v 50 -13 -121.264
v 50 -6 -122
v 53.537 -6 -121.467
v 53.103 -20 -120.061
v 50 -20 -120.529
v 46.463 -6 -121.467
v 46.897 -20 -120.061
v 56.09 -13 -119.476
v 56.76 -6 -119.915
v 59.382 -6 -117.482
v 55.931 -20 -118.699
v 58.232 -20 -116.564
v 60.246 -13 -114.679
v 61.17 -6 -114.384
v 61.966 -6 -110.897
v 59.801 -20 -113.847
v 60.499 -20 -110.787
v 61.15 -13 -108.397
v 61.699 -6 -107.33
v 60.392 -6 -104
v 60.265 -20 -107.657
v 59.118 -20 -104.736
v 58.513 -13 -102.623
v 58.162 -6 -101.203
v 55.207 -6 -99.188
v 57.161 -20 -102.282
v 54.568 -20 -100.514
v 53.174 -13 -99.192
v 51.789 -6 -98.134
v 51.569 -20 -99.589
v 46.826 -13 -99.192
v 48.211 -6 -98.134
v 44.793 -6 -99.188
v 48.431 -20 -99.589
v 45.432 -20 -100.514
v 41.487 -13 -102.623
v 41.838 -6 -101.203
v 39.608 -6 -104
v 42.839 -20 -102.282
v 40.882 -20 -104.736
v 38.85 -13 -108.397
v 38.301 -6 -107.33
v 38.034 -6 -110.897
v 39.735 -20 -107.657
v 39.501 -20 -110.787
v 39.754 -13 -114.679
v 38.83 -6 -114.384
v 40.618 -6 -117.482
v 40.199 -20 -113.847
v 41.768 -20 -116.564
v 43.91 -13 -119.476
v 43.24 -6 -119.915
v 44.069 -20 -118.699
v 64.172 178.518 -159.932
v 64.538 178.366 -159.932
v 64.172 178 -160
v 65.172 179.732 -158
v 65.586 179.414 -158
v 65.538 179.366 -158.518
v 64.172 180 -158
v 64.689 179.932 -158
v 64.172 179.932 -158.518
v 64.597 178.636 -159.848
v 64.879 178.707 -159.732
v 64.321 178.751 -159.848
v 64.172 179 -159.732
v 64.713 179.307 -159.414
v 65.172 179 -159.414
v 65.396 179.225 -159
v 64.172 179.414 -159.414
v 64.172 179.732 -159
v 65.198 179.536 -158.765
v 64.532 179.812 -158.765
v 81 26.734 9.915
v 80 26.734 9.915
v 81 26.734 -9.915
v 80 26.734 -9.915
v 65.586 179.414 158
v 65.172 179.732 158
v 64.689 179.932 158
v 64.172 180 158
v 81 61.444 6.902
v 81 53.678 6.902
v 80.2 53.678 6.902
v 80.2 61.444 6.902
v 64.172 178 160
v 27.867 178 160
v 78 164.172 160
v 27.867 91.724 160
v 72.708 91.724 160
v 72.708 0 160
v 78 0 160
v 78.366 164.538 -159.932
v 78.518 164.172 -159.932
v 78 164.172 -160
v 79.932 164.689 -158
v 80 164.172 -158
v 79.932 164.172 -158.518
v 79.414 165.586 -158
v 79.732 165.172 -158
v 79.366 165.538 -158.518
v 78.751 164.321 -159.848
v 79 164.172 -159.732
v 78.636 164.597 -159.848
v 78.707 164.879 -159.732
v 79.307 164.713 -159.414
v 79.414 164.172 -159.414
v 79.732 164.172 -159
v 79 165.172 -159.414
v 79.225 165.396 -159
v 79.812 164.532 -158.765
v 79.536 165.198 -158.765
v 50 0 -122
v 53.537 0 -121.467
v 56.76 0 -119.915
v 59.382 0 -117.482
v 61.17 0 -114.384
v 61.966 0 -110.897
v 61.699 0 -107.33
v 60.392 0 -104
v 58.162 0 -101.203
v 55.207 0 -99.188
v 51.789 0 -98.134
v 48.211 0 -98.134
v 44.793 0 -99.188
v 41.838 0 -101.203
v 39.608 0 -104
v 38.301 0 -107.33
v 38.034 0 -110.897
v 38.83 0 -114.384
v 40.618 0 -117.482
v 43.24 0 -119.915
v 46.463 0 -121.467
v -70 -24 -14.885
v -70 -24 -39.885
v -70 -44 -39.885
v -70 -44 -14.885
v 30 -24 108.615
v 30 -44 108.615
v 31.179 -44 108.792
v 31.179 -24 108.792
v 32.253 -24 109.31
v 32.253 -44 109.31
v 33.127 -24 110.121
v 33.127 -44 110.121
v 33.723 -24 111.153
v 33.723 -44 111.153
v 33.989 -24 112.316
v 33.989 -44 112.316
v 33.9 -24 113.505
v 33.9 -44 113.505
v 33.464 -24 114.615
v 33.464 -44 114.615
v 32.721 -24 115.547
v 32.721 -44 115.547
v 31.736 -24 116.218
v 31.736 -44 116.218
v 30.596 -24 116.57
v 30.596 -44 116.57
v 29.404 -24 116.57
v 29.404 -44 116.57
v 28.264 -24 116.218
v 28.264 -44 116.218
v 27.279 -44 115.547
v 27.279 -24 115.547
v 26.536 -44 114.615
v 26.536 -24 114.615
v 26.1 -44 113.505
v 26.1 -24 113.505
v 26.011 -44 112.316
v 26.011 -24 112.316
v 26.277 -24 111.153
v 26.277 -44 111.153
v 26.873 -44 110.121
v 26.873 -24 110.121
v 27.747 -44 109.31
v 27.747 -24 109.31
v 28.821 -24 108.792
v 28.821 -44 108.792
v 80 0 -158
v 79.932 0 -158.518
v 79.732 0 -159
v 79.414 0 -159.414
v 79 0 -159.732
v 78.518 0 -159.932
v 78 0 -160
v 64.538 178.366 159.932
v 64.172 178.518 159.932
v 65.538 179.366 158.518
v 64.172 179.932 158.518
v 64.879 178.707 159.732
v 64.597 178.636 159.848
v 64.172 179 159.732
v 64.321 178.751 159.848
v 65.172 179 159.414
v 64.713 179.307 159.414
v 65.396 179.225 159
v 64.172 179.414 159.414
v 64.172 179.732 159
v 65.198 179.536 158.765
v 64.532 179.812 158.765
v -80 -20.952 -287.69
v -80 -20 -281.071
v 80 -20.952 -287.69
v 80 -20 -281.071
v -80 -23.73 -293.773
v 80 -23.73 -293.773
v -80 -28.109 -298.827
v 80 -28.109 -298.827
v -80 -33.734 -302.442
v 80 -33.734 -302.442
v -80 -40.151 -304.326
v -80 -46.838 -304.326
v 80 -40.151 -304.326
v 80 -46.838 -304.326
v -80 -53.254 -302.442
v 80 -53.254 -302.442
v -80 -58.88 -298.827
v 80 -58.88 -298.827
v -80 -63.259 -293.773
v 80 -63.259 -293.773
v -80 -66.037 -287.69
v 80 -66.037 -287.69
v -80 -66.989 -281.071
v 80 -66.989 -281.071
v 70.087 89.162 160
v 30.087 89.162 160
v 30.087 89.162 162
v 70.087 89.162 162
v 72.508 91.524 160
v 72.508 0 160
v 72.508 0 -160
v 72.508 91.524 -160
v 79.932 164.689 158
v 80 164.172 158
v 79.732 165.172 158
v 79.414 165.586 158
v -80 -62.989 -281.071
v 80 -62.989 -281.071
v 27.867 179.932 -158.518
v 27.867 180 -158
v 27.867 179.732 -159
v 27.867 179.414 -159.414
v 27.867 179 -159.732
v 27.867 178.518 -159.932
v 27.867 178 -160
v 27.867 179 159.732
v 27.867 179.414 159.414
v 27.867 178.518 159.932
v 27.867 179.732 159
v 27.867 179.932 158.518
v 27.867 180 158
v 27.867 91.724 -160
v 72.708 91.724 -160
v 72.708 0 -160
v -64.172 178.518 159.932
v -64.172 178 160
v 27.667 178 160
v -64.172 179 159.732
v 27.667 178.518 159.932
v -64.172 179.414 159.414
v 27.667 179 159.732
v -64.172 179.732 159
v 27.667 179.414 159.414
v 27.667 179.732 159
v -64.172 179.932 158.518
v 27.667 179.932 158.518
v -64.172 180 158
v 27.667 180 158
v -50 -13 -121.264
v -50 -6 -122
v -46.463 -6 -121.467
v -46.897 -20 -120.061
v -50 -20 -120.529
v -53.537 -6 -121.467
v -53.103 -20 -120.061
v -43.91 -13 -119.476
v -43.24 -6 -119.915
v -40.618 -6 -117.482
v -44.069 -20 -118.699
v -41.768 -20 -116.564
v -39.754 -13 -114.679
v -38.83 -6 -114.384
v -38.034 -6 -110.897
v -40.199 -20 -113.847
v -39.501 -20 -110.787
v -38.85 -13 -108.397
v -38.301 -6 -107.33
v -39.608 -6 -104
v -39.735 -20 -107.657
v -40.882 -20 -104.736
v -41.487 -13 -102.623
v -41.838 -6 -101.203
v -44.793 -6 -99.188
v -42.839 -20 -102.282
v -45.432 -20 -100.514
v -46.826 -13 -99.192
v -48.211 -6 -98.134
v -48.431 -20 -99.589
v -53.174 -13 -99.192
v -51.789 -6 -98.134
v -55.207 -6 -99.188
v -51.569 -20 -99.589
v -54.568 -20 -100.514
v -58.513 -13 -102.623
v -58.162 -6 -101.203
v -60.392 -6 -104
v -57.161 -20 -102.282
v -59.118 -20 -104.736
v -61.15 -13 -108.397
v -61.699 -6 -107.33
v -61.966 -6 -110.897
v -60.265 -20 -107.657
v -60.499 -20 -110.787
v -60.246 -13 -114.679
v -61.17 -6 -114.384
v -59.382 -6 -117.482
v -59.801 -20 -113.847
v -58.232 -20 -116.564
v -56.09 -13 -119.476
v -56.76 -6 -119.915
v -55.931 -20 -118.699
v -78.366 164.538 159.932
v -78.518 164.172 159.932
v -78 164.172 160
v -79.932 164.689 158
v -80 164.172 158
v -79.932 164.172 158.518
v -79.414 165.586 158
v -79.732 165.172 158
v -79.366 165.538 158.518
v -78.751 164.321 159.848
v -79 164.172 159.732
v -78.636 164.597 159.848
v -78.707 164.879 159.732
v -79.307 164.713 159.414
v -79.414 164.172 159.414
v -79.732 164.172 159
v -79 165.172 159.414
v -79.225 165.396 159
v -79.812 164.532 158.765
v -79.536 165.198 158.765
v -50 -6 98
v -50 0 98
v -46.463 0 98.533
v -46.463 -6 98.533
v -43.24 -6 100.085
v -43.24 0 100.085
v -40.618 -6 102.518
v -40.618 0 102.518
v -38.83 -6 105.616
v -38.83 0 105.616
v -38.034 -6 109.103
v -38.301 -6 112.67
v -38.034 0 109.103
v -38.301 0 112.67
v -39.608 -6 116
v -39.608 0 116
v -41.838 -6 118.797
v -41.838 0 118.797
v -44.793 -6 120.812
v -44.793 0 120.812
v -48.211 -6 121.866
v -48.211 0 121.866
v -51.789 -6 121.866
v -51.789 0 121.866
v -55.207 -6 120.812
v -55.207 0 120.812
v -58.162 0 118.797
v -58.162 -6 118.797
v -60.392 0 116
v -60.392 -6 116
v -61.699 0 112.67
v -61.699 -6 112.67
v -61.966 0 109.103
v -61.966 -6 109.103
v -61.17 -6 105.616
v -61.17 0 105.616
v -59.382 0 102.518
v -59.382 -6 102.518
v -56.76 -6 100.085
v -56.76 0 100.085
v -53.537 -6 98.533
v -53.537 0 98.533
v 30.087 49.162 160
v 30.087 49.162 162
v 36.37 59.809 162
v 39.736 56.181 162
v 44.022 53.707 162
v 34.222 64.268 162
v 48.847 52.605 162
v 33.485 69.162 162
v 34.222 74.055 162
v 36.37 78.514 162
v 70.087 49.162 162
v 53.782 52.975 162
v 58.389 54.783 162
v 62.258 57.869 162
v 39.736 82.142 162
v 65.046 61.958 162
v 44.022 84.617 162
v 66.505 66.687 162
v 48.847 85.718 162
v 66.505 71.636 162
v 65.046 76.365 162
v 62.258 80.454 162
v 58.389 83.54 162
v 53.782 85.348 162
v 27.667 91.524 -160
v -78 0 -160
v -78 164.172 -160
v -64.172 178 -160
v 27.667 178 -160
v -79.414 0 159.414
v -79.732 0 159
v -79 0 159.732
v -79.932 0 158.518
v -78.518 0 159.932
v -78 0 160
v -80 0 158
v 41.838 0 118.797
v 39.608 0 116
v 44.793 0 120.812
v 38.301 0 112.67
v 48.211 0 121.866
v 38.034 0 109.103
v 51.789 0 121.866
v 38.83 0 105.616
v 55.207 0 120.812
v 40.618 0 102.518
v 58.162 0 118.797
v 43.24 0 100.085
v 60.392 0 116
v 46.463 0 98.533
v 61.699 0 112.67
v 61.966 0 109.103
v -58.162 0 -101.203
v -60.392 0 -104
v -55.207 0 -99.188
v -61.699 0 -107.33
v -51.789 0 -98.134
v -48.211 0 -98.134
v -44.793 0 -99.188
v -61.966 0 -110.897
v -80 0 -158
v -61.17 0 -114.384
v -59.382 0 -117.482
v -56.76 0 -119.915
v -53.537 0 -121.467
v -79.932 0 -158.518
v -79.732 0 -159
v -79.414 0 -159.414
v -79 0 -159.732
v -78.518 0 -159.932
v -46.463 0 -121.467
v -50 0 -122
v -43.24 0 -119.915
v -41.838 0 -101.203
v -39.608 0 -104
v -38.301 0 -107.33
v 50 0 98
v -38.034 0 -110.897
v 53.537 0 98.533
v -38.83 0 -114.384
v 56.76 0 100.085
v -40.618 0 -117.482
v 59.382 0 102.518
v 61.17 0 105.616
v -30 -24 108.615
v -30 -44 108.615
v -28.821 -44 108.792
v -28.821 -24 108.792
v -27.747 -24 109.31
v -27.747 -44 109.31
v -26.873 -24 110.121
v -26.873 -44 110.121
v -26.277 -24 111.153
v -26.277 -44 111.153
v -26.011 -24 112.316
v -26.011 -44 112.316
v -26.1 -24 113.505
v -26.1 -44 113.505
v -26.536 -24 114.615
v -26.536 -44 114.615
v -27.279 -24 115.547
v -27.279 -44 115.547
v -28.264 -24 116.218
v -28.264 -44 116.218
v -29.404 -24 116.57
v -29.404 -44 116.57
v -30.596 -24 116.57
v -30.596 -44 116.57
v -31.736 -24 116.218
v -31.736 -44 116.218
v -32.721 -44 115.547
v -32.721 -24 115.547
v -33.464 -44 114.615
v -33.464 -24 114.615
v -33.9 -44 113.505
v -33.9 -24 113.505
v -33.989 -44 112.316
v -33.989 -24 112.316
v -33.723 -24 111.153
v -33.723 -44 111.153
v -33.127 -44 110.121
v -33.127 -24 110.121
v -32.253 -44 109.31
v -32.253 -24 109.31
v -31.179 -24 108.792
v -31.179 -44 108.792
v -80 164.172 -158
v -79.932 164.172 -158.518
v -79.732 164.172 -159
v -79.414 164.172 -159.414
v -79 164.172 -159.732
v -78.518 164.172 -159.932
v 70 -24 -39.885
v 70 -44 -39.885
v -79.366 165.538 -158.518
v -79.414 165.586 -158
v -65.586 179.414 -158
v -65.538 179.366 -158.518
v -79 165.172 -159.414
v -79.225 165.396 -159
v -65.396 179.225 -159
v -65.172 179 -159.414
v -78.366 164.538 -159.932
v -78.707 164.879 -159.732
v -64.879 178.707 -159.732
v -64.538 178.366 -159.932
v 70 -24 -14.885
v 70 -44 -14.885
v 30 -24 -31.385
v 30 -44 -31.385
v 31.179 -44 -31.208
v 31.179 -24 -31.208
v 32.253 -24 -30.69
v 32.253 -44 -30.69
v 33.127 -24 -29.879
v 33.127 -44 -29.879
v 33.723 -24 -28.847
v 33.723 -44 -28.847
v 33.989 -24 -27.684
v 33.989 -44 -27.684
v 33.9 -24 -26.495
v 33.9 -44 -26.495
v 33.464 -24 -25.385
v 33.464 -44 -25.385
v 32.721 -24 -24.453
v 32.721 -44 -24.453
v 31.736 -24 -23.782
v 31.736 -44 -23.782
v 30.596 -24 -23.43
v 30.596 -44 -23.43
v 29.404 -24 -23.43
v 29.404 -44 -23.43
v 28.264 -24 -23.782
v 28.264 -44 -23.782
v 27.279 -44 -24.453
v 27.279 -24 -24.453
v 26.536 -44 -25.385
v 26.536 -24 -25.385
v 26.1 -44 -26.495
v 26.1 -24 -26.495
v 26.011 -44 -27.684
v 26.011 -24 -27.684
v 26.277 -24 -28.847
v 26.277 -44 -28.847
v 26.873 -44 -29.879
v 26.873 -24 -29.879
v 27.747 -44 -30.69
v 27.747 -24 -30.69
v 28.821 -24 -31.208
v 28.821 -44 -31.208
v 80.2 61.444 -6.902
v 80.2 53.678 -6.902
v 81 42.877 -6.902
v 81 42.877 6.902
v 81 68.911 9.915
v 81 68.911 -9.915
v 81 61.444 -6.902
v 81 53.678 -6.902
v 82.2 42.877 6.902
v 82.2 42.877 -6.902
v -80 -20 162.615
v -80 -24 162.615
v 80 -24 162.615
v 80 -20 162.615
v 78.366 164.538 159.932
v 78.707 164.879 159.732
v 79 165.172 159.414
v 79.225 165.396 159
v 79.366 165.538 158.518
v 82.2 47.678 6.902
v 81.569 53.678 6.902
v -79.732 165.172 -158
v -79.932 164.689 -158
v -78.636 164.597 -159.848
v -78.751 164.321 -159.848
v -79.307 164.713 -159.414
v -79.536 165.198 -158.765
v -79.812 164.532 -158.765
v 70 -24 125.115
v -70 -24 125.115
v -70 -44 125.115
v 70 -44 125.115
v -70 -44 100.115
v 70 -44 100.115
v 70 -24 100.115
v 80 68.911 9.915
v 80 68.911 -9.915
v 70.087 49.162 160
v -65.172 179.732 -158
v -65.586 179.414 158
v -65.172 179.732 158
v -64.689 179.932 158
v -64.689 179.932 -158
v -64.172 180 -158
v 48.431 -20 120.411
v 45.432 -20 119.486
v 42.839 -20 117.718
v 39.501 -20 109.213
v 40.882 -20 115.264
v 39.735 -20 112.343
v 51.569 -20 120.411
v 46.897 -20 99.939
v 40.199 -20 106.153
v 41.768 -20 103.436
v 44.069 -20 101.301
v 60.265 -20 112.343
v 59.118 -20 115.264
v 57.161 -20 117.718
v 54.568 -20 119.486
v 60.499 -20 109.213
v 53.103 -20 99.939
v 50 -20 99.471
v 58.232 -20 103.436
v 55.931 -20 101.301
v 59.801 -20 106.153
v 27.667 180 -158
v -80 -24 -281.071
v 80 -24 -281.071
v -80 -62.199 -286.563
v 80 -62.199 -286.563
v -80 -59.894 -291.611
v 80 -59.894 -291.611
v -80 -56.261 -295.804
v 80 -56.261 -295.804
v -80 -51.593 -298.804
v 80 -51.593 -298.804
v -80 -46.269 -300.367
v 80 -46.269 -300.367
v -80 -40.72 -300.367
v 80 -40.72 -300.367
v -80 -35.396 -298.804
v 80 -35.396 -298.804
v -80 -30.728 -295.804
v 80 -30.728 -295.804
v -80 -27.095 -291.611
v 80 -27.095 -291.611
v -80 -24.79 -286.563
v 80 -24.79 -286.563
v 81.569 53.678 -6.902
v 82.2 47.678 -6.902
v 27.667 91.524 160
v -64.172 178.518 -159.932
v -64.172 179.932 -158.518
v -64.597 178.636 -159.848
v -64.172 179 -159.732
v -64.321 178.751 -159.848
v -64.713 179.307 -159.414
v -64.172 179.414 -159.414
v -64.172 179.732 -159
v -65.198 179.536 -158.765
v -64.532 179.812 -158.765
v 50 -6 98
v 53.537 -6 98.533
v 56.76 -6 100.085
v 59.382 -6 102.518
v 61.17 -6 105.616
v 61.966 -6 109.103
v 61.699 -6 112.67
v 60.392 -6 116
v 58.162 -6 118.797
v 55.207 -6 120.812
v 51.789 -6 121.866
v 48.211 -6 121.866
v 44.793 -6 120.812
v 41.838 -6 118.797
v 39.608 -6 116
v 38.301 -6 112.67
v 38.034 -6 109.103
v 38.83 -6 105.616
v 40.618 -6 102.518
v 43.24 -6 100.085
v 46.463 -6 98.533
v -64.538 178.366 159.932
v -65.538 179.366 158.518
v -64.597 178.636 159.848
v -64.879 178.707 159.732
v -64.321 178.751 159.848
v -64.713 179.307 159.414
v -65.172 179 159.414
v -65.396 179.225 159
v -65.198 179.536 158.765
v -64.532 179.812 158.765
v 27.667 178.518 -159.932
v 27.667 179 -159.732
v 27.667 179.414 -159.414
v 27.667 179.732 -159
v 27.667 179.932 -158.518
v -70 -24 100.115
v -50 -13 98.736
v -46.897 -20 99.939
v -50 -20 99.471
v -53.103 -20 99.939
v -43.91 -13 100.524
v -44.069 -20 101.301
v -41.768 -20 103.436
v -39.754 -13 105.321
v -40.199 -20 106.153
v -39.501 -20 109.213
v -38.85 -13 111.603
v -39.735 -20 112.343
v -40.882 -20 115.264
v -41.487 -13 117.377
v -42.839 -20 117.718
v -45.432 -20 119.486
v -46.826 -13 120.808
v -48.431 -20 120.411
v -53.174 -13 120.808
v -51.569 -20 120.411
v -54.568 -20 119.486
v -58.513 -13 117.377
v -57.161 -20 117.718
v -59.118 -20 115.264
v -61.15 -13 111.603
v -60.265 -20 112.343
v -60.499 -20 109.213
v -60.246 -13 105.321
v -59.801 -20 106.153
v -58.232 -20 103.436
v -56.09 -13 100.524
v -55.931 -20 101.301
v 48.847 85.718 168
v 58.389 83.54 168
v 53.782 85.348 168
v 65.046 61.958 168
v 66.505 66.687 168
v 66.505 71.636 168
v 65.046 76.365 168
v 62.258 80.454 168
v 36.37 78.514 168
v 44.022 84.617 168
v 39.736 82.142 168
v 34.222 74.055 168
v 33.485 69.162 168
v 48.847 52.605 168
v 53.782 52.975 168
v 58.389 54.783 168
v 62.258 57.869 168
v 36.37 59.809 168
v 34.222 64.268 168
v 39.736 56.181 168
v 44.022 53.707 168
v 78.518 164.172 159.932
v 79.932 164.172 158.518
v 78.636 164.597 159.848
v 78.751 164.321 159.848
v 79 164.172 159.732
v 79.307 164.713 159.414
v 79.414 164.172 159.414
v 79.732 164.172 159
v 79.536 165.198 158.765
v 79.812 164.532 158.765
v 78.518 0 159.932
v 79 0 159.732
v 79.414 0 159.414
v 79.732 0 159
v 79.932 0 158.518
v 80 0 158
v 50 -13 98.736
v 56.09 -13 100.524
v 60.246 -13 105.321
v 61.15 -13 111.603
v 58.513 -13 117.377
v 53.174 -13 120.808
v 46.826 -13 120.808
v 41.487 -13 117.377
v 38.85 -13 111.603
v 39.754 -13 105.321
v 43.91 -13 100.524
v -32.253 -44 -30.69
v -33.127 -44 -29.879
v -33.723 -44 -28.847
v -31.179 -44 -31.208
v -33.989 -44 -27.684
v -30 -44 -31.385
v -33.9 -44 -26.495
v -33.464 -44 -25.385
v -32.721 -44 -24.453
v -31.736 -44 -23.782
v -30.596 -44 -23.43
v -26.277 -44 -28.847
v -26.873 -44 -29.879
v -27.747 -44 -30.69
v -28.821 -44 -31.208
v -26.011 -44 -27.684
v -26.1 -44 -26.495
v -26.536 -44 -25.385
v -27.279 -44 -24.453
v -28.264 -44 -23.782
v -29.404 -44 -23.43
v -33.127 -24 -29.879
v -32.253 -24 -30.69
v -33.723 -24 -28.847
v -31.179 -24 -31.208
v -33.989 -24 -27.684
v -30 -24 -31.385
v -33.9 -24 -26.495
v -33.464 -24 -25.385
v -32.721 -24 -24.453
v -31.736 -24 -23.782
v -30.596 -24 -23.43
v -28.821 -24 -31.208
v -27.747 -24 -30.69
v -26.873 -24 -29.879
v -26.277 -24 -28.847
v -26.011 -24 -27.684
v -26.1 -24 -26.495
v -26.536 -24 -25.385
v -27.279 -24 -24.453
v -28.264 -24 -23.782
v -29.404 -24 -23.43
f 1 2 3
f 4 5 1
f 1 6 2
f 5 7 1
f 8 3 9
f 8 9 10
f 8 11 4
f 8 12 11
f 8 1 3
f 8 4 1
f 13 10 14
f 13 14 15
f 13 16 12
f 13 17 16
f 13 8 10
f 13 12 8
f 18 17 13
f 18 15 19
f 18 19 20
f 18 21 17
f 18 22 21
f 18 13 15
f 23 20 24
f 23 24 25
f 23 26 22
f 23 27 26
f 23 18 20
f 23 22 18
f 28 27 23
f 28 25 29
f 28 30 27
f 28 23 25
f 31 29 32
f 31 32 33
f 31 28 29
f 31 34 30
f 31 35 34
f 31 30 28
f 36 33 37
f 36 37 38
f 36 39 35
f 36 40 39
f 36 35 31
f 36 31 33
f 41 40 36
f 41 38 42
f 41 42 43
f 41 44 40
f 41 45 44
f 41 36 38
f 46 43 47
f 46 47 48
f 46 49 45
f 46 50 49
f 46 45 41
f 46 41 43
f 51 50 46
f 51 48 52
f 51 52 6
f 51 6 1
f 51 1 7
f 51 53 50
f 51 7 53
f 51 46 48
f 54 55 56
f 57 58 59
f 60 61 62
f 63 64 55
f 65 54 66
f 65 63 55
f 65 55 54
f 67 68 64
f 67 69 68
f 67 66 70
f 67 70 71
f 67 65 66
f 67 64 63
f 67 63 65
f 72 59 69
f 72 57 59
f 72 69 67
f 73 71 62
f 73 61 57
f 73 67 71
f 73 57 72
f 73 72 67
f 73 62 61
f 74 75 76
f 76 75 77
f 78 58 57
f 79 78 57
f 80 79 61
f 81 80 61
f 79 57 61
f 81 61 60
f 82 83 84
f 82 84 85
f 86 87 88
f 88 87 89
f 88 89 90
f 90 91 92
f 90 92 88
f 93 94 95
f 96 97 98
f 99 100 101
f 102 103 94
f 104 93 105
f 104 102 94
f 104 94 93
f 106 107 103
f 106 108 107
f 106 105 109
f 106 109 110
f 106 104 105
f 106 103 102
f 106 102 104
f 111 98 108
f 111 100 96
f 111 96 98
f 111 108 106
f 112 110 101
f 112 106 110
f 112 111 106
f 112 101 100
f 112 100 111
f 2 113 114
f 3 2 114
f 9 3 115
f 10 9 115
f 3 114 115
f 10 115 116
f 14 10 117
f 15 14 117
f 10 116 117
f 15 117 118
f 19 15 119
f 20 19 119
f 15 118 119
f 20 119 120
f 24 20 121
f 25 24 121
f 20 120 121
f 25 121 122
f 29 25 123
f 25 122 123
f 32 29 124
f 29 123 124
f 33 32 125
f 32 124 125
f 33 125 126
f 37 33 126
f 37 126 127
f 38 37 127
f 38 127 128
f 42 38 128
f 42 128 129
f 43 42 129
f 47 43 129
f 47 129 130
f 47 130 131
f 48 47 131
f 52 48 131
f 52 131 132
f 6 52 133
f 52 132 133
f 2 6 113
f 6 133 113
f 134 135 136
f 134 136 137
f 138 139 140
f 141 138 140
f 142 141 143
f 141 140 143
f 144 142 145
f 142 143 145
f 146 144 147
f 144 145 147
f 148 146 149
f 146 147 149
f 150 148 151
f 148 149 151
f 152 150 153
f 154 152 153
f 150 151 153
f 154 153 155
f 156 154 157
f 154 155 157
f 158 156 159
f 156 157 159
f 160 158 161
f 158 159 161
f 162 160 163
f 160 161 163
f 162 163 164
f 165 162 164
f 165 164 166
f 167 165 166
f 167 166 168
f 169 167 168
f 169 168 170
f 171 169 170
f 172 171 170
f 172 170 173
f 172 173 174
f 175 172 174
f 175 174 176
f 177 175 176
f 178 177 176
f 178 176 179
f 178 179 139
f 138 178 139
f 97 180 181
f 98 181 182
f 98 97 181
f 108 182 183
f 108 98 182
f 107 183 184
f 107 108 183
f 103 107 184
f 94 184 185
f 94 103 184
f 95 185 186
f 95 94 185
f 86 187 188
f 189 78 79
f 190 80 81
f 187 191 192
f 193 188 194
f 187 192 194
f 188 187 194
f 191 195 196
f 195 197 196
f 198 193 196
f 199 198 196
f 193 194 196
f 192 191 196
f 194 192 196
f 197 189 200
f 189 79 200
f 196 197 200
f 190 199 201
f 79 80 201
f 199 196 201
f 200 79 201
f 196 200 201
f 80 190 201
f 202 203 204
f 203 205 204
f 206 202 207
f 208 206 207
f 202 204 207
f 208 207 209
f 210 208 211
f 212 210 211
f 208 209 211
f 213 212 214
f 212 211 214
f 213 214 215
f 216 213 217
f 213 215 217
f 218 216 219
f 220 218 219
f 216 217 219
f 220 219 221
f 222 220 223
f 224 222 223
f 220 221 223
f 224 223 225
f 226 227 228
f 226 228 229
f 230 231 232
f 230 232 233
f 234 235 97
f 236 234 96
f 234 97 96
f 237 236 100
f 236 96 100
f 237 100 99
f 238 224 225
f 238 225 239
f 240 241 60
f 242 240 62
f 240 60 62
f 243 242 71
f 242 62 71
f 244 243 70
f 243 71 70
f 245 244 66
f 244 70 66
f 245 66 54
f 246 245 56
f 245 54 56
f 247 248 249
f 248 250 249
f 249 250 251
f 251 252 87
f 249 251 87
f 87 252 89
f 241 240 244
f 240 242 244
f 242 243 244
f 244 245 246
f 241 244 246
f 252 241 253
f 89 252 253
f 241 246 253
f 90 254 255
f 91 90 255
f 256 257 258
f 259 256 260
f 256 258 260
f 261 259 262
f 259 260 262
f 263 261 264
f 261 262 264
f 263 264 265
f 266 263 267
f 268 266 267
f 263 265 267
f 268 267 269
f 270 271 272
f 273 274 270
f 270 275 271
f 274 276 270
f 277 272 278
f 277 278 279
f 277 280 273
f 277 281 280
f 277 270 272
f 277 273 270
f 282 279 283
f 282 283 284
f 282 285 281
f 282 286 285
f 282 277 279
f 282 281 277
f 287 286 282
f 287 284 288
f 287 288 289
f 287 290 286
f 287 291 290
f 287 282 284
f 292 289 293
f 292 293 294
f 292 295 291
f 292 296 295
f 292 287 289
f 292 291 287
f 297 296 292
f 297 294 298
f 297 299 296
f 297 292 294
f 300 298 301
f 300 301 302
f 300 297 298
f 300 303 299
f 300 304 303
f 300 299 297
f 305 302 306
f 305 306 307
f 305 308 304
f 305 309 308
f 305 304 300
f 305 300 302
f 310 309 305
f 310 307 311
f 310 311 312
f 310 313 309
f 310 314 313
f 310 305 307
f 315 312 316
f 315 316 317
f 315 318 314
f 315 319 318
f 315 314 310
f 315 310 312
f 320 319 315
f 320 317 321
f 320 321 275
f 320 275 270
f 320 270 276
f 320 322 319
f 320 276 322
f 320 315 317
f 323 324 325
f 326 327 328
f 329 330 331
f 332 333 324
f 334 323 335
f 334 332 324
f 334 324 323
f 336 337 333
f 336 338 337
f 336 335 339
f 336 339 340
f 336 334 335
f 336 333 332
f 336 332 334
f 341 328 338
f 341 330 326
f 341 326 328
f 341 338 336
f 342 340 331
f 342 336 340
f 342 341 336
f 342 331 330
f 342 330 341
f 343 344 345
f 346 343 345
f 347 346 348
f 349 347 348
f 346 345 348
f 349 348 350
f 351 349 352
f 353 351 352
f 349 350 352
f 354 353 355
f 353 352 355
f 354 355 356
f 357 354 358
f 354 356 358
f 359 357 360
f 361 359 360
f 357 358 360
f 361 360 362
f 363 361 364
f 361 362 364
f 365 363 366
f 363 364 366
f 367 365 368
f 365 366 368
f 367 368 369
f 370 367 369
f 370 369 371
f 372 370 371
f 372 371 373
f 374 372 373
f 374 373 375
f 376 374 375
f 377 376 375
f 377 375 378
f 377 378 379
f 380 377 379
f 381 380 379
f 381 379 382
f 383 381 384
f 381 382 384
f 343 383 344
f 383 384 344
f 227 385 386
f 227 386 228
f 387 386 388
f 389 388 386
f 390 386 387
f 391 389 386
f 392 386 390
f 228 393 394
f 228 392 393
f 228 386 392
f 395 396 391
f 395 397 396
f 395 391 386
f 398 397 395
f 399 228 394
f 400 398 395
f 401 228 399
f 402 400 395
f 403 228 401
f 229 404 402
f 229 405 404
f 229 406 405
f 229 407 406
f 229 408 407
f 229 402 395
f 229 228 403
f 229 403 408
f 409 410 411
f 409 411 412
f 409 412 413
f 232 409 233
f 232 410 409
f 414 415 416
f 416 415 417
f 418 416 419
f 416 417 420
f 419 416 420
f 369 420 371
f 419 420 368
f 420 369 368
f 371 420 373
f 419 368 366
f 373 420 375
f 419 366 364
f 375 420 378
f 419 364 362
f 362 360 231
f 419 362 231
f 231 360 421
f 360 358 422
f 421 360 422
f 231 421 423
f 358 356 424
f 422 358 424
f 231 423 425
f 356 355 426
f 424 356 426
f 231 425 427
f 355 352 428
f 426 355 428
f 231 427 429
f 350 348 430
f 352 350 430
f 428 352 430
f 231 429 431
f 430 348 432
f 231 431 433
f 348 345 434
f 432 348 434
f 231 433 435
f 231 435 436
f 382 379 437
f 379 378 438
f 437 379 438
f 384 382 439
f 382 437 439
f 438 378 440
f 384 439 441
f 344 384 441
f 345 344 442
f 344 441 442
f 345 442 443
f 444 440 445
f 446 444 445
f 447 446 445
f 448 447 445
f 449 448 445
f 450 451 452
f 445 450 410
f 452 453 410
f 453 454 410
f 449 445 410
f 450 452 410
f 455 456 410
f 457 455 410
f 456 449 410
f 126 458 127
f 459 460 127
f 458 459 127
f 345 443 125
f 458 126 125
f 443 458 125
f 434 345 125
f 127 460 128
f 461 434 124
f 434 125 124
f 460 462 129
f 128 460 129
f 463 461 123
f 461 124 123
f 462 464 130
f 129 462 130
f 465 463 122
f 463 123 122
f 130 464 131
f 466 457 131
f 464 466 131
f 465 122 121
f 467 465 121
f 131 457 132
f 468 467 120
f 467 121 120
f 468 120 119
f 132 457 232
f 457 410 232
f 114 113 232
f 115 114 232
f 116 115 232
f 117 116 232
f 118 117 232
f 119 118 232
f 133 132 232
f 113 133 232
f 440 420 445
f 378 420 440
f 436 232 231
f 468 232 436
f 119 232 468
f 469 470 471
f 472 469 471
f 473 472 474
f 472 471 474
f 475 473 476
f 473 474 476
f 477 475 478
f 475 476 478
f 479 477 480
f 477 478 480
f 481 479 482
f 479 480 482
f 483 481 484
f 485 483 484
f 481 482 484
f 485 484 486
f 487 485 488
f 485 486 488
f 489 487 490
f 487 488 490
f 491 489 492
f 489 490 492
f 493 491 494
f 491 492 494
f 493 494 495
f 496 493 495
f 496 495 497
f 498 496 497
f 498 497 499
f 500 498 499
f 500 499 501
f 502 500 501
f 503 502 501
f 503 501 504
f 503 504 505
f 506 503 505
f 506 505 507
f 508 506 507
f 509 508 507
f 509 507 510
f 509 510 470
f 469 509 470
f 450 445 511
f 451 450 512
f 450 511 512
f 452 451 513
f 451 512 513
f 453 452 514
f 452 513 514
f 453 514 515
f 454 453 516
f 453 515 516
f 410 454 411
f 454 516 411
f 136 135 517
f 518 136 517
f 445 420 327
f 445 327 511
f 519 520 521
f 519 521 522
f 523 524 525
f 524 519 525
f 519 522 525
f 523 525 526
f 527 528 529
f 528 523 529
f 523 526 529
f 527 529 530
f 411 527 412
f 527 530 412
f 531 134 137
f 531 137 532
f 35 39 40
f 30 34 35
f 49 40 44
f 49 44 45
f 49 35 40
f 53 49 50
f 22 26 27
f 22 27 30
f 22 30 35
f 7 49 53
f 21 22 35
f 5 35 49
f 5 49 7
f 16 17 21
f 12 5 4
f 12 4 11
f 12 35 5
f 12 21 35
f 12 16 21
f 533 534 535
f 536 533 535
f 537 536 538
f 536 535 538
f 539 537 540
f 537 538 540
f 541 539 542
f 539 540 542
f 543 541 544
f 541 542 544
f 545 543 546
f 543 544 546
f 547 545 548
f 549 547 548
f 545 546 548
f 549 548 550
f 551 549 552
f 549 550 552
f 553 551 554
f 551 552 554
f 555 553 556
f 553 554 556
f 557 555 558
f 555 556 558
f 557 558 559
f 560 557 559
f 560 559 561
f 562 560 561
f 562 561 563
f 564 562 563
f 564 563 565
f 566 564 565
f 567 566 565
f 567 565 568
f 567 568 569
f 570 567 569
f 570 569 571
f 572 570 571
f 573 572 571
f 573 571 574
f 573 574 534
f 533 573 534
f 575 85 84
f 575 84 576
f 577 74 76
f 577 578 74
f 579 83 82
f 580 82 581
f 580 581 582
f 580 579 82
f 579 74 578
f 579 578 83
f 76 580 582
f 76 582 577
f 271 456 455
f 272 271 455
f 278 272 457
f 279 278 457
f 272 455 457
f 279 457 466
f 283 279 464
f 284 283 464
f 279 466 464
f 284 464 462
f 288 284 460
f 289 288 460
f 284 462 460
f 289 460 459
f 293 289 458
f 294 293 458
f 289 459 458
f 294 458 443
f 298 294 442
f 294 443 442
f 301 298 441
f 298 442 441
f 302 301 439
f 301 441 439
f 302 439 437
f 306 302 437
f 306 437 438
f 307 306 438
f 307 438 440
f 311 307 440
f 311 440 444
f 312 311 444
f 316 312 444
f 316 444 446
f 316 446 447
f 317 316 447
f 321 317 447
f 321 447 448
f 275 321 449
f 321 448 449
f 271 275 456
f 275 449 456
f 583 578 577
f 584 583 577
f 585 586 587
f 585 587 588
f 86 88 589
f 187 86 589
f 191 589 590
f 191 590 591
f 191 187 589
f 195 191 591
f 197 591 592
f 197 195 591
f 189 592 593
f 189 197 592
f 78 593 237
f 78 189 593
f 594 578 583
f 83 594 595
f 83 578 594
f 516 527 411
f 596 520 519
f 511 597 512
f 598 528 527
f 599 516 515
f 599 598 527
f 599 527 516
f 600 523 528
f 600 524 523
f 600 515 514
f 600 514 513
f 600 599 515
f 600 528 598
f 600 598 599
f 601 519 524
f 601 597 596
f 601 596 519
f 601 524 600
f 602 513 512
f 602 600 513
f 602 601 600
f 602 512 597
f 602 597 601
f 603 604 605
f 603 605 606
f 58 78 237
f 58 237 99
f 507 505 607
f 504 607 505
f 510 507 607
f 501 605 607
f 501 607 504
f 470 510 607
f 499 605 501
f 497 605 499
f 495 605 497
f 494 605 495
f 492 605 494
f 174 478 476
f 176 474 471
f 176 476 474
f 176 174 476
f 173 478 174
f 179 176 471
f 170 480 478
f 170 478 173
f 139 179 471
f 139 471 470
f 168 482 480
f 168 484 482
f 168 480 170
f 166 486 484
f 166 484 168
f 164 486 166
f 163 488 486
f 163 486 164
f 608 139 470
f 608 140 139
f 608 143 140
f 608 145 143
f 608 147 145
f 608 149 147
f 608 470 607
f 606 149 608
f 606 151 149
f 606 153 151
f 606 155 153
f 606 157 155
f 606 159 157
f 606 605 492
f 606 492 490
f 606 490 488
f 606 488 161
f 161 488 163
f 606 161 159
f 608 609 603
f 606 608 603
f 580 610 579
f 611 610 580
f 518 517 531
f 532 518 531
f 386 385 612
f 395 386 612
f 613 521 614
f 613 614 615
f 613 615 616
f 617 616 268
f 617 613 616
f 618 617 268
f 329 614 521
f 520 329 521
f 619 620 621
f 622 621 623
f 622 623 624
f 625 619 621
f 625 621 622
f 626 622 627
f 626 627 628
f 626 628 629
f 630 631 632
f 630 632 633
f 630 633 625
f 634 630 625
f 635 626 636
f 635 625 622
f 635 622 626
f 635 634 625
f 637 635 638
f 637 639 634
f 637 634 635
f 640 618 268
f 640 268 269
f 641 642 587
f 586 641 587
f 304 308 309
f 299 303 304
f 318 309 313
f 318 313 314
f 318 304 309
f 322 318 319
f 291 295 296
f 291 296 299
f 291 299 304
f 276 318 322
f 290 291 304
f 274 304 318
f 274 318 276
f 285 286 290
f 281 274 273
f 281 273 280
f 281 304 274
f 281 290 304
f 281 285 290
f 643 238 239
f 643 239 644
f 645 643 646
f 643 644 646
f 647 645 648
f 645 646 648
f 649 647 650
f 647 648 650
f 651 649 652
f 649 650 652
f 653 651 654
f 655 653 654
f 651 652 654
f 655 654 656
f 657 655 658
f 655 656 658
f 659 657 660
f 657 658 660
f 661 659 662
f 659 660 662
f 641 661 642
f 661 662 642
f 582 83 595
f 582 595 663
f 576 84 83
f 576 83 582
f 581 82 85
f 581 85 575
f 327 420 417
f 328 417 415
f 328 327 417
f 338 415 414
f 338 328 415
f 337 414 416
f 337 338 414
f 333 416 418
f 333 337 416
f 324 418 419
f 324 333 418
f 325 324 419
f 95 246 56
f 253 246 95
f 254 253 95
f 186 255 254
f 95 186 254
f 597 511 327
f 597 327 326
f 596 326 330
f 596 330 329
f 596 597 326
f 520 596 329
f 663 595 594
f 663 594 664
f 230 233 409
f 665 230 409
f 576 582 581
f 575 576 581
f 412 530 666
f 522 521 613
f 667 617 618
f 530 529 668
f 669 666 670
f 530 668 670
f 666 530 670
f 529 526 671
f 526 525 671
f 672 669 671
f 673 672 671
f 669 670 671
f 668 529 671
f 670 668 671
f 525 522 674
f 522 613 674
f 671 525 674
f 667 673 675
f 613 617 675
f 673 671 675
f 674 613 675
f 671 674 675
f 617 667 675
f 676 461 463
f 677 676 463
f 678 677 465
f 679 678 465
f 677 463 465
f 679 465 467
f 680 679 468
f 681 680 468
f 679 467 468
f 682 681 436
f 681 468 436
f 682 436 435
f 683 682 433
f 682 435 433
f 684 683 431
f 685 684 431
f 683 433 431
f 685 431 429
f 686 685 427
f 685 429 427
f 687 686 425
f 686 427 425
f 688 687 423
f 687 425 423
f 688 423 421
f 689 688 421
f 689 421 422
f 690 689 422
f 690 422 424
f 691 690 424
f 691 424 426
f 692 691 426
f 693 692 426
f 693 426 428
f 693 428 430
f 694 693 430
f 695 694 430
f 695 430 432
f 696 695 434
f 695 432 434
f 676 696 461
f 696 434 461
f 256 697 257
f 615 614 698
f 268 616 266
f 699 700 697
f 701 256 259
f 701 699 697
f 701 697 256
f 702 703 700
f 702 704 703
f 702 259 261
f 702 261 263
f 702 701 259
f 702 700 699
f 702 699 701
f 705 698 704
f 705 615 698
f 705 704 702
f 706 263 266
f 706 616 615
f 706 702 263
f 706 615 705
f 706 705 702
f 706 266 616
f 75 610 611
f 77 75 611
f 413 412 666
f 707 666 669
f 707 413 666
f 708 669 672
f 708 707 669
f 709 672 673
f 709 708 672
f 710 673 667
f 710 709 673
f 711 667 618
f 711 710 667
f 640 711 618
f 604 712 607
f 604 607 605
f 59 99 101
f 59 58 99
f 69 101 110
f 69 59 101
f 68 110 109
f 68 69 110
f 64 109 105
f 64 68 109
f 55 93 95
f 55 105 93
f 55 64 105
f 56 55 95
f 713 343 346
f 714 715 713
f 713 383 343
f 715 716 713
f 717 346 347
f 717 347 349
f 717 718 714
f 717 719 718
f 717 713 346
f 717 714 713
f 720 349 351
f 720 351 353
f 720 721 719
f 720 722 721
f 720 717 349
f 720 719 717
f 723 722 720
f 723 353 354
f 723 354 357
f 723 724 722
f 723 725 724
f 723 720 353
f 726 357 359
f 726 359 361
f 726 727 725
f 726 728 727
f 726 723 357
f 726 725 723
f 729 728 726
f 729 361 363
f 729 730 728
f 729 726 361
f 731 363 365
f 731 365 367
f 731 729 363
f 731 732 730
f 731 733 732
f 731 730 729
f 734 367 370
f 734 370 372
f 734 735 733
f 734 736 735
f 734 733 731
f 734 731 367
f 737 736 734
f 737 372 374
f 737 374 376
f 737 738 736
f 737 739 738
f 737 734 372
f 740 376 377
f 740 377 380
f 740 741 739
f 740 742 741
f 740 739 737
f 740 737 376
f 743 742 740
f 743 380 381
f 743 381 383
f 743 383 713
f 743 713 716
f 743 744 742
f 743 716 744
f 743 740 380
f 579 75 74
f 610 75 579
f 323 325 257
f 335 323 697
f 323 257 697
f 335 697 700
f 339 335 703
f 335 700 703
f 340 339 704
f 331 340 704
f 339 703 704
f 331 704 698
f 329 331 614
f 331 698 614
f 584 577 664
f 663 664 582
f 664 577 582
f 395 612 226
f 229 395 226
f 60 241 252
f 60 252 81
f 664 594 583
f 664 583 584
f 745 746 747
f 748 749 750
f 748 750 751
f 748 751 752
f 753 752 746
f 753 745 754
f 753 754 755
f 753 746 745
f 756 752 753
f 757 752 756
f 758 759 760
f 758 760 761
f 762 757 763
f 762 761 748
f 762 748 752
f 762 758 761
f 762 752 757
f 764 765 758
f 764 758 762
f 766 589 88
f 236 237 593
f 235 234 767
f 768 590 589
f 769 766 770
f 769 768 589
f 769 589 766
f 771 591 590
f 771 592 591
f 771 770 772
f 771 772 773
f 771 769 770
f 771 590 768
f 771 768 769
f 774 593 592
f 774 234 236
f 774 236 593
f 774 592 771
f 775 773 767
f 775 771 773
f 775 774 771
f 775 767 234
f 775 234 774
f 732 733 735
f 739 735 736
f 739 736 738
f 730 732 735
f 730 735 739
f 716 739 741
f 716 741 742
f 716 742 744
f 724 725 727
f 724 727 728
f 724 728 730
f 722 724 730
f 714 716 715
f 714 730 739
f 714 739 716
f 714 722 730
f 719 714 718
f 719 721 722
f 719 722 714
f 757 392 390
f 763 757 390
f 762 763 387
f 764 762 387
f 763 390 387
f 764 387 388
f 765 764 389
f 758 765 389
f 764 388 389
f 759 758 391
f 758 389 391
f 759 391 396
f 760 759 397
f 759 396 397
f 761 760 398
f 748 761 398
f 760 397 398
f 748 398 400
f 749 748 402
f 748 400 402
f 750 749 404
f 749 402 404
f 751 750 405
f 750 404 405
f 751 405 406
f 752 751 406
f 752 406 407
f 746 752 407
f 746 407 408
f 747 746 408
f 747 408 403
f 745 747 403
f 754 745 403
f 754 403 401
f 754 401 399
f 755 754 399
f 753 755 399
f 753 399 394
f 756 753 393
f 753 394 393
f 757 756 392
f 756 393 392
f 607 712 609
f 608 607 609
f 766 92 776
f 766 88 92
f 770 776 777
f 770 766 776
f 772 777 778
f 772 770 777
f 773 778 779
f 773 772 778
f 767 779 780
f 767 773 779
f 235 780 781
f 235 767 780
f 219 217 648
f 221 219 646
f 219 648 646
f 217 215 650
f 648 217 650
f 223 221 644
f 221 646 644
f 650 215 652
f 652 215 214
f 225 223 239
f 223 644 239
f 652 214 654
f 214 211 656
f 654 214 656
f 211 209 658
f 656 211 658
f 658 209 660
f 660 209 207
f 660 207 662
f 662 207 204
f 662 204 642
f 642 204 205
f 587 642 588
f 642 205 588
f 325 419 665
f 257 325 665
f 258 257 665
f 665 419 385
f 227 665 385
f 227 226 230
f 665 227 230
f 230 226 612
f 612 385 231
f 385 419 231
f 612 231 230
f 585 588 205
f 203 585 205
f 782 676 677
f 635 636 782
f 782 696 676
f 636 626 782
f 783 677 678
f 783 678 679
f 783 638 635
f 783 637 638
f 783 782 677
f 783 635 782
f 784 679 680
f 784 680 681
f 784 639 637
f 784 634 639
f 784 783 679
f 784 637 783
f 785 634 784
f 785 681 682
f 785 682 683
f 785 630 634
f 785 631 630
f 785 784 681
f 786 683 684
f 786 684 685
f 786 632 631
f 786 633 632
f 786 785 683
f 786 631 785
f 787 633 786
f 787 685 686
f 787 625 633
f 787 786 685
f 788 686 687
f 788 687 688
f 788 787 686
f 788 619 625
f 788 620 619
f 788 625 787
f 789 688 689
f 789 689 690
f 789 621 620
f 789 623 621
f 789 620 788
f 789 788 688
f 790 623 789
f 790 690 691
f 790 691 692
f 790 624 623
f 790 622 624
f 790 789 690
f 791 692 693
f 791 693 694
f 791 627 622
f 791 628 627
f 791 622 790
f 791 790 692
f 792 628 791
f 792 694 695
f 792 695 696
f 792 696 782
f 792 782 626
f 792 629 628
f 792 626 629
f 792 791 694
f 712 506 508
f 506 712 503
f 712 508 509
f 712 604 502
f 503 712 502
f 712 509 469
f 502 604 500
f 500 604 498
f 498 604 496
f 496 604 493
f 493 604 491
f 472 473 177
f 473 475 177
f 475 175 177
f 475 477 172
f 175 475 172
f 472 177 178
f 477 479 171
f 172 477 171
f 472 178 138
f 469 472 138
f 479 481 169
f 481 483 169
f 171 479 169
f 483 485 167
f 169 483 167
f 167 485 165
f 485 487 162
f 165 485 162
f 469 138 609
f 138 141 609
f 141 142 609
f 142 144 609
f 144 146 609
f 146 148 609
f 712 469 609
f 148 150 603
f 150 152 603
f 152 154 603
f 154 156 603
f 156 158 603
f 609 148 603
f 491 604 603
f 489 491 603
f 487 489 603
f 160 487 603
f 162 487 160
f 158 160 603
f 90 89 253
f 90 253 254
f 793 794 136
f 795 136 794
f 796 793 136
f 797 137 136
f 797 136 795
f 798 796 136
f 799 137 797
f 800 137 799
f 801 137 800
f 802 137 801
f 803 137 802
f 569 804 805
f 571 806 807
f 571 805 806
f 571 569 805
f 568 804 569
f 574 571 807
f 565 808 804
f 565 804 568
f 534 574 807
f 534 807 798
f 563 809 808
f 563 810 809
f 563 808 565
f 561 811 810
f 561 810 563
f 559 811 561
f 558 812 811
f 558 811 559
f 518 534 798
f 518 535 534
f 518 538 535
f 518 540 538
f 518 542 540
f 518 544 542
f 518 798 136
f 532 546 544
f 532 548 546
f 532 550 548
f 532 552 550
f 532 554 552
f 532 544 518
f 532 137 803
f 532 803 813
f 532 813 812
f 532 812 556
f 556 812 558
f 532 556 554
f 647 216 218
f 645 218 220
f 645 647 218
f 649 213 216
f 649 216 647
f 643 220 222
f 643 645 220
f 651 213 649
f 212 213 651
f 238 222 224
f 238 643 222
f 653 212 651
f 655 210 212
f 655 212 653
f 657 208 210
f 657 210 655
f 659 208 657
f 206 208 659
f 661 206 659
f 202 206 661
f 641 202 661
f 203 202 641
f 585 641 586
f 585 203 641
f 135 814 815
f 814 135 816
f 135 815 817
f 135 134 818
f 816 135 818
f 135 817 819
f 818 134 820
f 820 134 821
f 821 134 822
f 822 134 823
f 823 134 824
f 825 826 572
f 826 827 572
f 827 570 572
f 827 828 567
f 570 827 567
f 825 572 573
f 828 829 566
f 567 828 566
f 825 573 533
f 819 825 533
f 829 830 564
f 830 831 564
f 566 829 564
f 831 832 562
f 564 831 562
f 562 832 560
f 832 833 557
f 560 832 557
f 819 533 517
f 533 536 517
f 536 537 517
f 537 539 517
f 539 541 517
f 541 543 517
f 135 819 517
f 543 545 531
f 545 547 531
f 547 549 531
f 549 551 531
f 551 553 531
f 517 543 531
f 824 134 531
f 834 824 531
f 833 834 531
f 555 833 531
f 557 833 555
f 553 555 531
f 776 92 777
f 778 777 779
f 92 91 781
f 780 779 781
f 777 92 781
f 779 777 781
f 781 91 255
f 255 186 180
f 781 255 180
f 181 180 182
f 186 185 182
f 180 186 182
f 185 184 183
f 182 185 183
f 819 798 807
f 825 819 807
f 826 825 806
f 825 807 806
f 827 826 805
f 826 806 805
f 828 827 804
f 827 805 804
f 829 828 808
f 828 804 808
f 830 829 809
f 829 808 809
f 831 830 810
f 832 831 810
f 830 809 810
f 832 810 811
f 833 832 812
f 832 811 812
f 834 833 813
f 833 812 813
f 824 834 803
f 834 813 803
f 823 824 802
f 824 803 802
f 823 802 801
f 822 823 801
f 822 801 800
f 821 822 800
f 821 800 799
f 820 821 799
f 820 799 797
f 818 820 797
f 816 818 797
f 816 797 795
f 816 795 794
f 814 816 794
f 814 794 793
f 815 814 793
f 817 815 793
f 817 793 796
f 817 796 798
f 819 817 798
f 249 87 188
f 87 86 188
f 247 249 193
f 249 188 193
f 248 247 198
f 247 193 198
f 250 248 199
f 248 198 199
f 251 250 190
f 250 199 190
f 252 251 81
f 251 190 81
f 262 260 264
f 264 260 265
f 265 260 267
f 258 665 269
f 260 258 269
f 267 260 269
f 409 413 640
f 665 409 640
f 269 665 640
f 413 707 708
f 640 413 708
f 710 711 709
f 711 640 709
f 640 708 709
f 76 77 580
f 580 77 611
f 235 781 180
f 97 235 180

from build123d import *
from OCP.BRepFilletAPI import BRepFilletAPI_MakeChamfer

# Parameters (mm, degrees)
SKETCH_1_W               = 160
SKETCH_1_H               = 320
EXTRUDE_1_DEPTH          = 180
CUT_EXTRUDE_3_DEPTH      = 0.2
CUT_EXTRUDE_3_DEPTH_BACK = 376.765884561
CHAMFER_1_SIZE           = 15
CHAMFER_2_SIZE           = 15
FILLET_1_R               = 2
FILLET_2_R               = 2
SKETCH_3_W               = 19.82949963
SKETCH_3_H               = 42.177030959
EXTRUDE_2_DEPTH          = 1
SKETCH_4_W               = 13.804854044
SKETCH_4_H               = 18.566163121
CUT_EXTRUDE_2_DEPTH      = 0.8
SKETCH_5_W               = 40
SKETCH_5_H               = 40
EXTRUDE_3_DEPTH          = 2
SKETCH_6_R               = 16.60269393
EXTRUDE_4_DEPTH          = 6
SKETCH_7_R               = 12
EXTRUDE_5_DEPTH          = 20
CHAMFER_3_SIZE           = 14
CHAMFER_3_SIZE2          = 1.471459294
EXTRUDE_6_DEPTH          = 80
SKETCH_10_W              = 140
SKETCH_10_H              = 25
EXTRUDE_7_DEPTH          = 20
EXTRUDE_7_2_DEPTH        = 20
SKETCH_11_R              = 4
CUT_EXTRUDE_3_2_DEPTH    = 30
SKETCH_13_W              = 13.804854044
SKETCH_13_H              = 10.800130904
EXTRUDE_8_DEPTH          = 2
CHAMFER_4_SIZE           = 6
CHAMFER_4_SIZE2          = 0.630625412


with BuildPart() as part:
    # 草图1 → 凸台-拉伸1 (new body)
    with BuildSketch(Plane(origin=(0, 0, 0), x_dir=(1, 0, 0), z_dir=(0, 1, 0))):
        Rectangle(SKETCH_1_W, SKETCH_1_H)
    extrude(amount=EXTRUDE_1_DEPTH)

    # 草图2 → Cut-Extrude 3 (cut, two sides: drawn at the far end of the back side and taken through both)
    with BuildSketch(Plane.XY.offset(160).offset(-CUT_EXTRUDE_3_DEPTH_BACK)):
        Polygon((27.867220045, 180), (27.867220045, 91.72383251), (72.707594266, 91.72383251), (72.707594266, 0), (72.507594266, 0), (72.507594266, 91.52383251), (27.667220045, 91.52383251), (27.667220045, 180), align=None)
    extrude(amount=CUT_EXTRUDE_3_DEPTH + CUT_EXTRUDE_3_DEPTH_BACK, mode=Mode.SUBTRACT)


with BuildPart() as cut_extrude_3_piece_1:
    # of the separate pieces the step leaves, piece 1, a body of its own (cut_extrude_3_pieces)
    add(part.part.solids().sort_by_distance((-80, 0, 160))[0])

    # 倒角2
    chamfer_2_edges = [cut_extrude_3_piece_1.edges().sort_by_distance(p)[0] for p in [
        (-80, 180, 0),
    ]]
    chamfer(chamfer_2_edges, length=CHAMFER_2_SIZE)

    # 圆角2
    fillet_2_edges = [cut_extrude_3_piece_1.edges().sort_by_distance(p)[0] for p in [
        (-18.666389977, 180, 160),
        (-65, 180, 0),
        (-80, 82.5, 160),
        (-72.5, 172.5, 160),
        (-80, 82.5, -160),
        (-80, 165, 0),
        (-72.5, 172.5, -160),
        (-18.666389977, 180, -160),
    ]]
    fillet(fillet_2_edges, radius=FILLET_2_R)

    # 草图5 → 凸台-拉伸3 (add)
    with BuildSketch(Plane.XY.offset(160)):
        with Locations((50.087407156, 69.161685825)):
            Rectangle(SKETCH_5_W, SKETCH_5_H)
    extrude(amount=EXTRUDE_3_DEPTH)

    # 草图6 → 凸台-拉伸4 (add)
    with BuildSketch(Plane.XY.offset(162)):
        with Locations(Location((50.087407156, 69.161685825, 0), (0, 0, 180))):
            Circle(SKETCH_6_R)
    extrude(amount=EXTRUDE_4_DEPTH)

    # 草图7 → 凸台-拉伸5 (add)
    with BuildSketch(Plane.XZ):
        with Locations(Location((-50, 110, 0), (0, 0, 270))):
            Circle(SKETCH_7_R)
        with Locations(Location((50, 110, 0), (0, 0, 270))):
            Circle(SKETCH_7_R)
        with Locations(Location((-50, -110, 0), (0, 0, 270))):
            Circle(SKETCH_7_R)
        with Locations(Location((50, -110, 0), (0, 0, 270))):
            Circle(SKETCH_7_R)
    extrude(amount=EXTRUDE_5_DEPTH)

    # 倒角3: one chamfer whose edges measure the first distance from different faces: ONE call of the kernel's chamfer builder (chamfer() names one face for all edges)
    chamfer_3_edges_1 = [cut_extrude_3_piece_1.edges().sort_by_distance(p)[0] for p in [
        (-50, -20, 122),
    ]]
    chamfer_3_side_1 = [cut_extrude_3_piece_1.faces().sort_by_distance(p)[0] for p in [
        (-50, -10, 122),
    ]]
    chamfer_3_edges_2 = [cut_extrude_3_piece_1.edges().sort_by_distance(p)[0] for p in [
        (50, -20, 122),
    ]]
    chamfer_3_side_2 = [cut_extrude_3_piece_1.faces().sort_by_distance(p)[0] for p in [
        (50, -10, 122),
    ]]
    chamfer_3_edges_3 = [cut_extrude_3_piece_1.edges().sort_by_distance(p)[0] for p in [
        (-50, -20, -98),
    ]]
    chamfer_3_side_3 = [cut_extrude_3_piece_1.faces().sort_by_distance(p)[0] for p in [
        (-50, -10, -98),
    ]]
    chamfer_3_edges_4 = [cut_extrude_3_piece_1.edges().sort_by_distance(p)[0] for p in [
        (50, -20, -98),
    ]]
    chamfer_3_side_4 = [cut_extrude_3_piece_1.faces().sort_by_distance(p)[0] for p in [
        (50, -10, -98),
    ]]
    chamfer_3 = BRepFilletAPI_MakeChamfer(cut_extrude_3_piece_1.part.solid().wrapped)
    for e in chamfer_3_edges_1:
        chamfer_3.Add(CHAMFER_3_SIZE, CHAMFER_3_SIZE2, e.wrapped, chamfer_3_side_1[0].wrapped)  # the first distance lies on this face
    for e in chamfer_3_edges_2:
        chamfer_3.Add(CHAMFER_3_SIZE, CHAMFER_3_SIZE2, e.wrapped, chamfer_3_side_2[0].wrapped)  # the first distance lies on this face
    for e in chamfer_3_edges_3:
        chamfer_3.Add(CHAMFER_3_SIZE, CHAMFER_3_SIZE2, e.wrapped, chamfer_3_side_3[0].wrapped)  # the first distance lies on this face
    for e in chamfer_3_edges_4:
        chamfer_3.Add(CHAMFER_3_SIZE, CHAMFER_3_SIZE2, e.wrapped, chamfer_3_side_4[0].wrapped)  # the first distance lies on this face
    add(Compound.cast(chamfer_3.Shape()), mode=Mode.REPLACE)


with BuildPart() as cut_extrude_3_piece_2:
    # of the separate pieces the step leaves, piece 2, a body of its own (cut_extrude_3_pieces)
    add(part.part.solids().sort_by_distance((72.707594266, 0, 160))[0])

    # 倒角1
    chamfer_1_edges = [cut_extrude_3_piece_2.edges().sort_by_distance(p)[0] for p in [
        (80, 180, 0),
    ]]
    chamfer(chamfer_1_edges, length=CHAMFER_1_SIZE)

    # 圆角1
    fillet_1_edges = [cut_extrude_3_piece_2.edges().sort_by_distance(p)[0] for p in [
        (46.433610023, 180, 160),
        (46.433610023, 180, -160),
        (65, 180, 0),
        (80, 82.5, -160),
        (72.5, 172.5, -160),
        (80, 82.5, 160),
        (80, 165, 0),
        (72.5, 172.5, 160),
    ]]
    fillet(fillet_1_edges, radius=FILLET_1_R)


with BuildPart() as body_3:
    # 草图3 → 凸台-拉伸2 (new body)
    with BuildSketch(Plane(origin=(80, 0, 0), x_dir=(0, 0, -1), z_dir=(1, 0, 0))):
        with Locations((0, 47.82296904)):
            Rectangle(SKETCH_3_W, SKETCH_3_H)
    extrude(amount=EXTRUDE_2_DEPTH)

    # 草图4 → 切除-拉伸2 (cut)
    with BuildSketch(Plane(origin=(81, 0, 0), x_dir=(0, 0, -1), z_dir=(1, 0, 0))):
        with Locations((0, 52.160572655)):
            Rectangle(SKETCH_4_W, SKETCH_4_H)
    extrude(amount=-CUT_EXTRUDE_2_DEPTH, mode=Mode.SUBTRACT)

    # 草图13 → 凸台-拉伸8 (add)
    with BuildSketch(Plane(origin=(80.2, 0, 0), x_dir=(0, 0, -1), z_dir=(1, 0, 0))):
        with Locations((0, 48.277556546)):
            Rectangle(SKETCH_13_W, SKETCH_13_H)
    extrude(amount=EXTRUDE_8_DEPTH)

    # 倒角4
    chamfer_4_edges = [body_3.edges().sort_by_distance(p)[0] for p in [
        (82.2, 53.677621998, 0),
    ]]
    chamfer_4_side = [body_3.faces().sort_by_distance(p)[0] for p in [
        (82.2, 48.277556546, 0),
    ]]
    chamfer(chamfer_4_edges, length=CHAMFER_4_SIZE, length2=CHAMFER_4_SIZE2, reference=chamfer_4_side[0])


with BuildPart() as body_4:
    # 草图9 → 凸台-拉伸6 (new, symmetric)
    with BuildSketch(Plane(origin=(0, 0, 0), x_dir=(0, 0, -1), z_dir=(1, 0, 0))):
        with BuildLine():
            Line((-162.614551414, -20), (281.071104968, -20))
            ThreePointArc((281.071104968, -20), (304.565495633, -43.494390665), (281.071104968, -66.988781331))
            Line((281.071104968, -66.988781331), (281.071104968, -62.988781331))
            ThreePointArc((281.071104968, -62.988781331), (300.565495633, -43.494390665), (281.071104968, -24))
            Line((281.071104968, -24), (-162.614551414, -24))
            Line((-162.614551414, -24), (-162.614551414, -20))
        make_face()
    extrude(amount=EXTRUDE_6_DEPTH, both=True)


with BuildPart() as body_5:
    # 草图10 → 凸台-拉伸7 (new body)
    with BuildSketch(Plane.XZ.offset(24)):
        with Locations((0, 112.614551414)):
            Rectangle(SKETCH_10_W, SKETCH_10_H)
    extrude(amount=EXTRUDE_7_DEPTH)


with BuildPart() as body_6:
    # 草图10 → Extrude 7 2 (new body)
    with BuildSketch(Plane.XZ.offset(24)):
        with Locations((0, -27.385448586)):
            Rectangle(SKETCH_10_W, SKETCH_10_H)
    extrude(amount=EXTRUDE_7_2_DEPTH)


with BuildPart() as cut_extrude_3_2_tool:
    # 草图11 → Cut-Extrude 3 2 (new body)
    with BuildSketch(Plane.XZ.offset(44)):
        with Locations(Location((-30, 112.614551414, 0), (0, 0, 270))):
            Circle(SKETCH_11_R)
        with Locations(Location((30, 112.614551414, 0), (0, 0, 270))):
            Circle(SKETCH_11_R)
        with Locations(Location((30, -27.385448586, 0), (0, 0, 270))):
            Circle(SKETCH_11_R)
        with Locations(Location((-30, -27.385448586, 0), (0, 0, 270))):
            Circle(SKETCH_11_R)
    extrude(amount=-CUT_EXTRUDE_3_2_DEPTH)


with BuildPart() as body_6_1:
    add(body_6.part)

    # Cut-Extrude 3 2: cut by cut_extrude_3_2_tool
    add(cut_extrude_3_2_tool.part, mode=Mode.SUBTRACT)


with BuildPart() as body_5_1:
    add(body_5.part)

    # Cut-Extrude 3 2: cut by cut_extrude_3_2_tool
    add(cut_extrude_3_2_tool.part, mode=Mode.SUBTRACT)


solid = Compound([cut_extrude_3_piece_1.part, cut_extrude_3_piece_2.part, body_3.part, body_4.part, body_6_1.part, body_5_1.part])
